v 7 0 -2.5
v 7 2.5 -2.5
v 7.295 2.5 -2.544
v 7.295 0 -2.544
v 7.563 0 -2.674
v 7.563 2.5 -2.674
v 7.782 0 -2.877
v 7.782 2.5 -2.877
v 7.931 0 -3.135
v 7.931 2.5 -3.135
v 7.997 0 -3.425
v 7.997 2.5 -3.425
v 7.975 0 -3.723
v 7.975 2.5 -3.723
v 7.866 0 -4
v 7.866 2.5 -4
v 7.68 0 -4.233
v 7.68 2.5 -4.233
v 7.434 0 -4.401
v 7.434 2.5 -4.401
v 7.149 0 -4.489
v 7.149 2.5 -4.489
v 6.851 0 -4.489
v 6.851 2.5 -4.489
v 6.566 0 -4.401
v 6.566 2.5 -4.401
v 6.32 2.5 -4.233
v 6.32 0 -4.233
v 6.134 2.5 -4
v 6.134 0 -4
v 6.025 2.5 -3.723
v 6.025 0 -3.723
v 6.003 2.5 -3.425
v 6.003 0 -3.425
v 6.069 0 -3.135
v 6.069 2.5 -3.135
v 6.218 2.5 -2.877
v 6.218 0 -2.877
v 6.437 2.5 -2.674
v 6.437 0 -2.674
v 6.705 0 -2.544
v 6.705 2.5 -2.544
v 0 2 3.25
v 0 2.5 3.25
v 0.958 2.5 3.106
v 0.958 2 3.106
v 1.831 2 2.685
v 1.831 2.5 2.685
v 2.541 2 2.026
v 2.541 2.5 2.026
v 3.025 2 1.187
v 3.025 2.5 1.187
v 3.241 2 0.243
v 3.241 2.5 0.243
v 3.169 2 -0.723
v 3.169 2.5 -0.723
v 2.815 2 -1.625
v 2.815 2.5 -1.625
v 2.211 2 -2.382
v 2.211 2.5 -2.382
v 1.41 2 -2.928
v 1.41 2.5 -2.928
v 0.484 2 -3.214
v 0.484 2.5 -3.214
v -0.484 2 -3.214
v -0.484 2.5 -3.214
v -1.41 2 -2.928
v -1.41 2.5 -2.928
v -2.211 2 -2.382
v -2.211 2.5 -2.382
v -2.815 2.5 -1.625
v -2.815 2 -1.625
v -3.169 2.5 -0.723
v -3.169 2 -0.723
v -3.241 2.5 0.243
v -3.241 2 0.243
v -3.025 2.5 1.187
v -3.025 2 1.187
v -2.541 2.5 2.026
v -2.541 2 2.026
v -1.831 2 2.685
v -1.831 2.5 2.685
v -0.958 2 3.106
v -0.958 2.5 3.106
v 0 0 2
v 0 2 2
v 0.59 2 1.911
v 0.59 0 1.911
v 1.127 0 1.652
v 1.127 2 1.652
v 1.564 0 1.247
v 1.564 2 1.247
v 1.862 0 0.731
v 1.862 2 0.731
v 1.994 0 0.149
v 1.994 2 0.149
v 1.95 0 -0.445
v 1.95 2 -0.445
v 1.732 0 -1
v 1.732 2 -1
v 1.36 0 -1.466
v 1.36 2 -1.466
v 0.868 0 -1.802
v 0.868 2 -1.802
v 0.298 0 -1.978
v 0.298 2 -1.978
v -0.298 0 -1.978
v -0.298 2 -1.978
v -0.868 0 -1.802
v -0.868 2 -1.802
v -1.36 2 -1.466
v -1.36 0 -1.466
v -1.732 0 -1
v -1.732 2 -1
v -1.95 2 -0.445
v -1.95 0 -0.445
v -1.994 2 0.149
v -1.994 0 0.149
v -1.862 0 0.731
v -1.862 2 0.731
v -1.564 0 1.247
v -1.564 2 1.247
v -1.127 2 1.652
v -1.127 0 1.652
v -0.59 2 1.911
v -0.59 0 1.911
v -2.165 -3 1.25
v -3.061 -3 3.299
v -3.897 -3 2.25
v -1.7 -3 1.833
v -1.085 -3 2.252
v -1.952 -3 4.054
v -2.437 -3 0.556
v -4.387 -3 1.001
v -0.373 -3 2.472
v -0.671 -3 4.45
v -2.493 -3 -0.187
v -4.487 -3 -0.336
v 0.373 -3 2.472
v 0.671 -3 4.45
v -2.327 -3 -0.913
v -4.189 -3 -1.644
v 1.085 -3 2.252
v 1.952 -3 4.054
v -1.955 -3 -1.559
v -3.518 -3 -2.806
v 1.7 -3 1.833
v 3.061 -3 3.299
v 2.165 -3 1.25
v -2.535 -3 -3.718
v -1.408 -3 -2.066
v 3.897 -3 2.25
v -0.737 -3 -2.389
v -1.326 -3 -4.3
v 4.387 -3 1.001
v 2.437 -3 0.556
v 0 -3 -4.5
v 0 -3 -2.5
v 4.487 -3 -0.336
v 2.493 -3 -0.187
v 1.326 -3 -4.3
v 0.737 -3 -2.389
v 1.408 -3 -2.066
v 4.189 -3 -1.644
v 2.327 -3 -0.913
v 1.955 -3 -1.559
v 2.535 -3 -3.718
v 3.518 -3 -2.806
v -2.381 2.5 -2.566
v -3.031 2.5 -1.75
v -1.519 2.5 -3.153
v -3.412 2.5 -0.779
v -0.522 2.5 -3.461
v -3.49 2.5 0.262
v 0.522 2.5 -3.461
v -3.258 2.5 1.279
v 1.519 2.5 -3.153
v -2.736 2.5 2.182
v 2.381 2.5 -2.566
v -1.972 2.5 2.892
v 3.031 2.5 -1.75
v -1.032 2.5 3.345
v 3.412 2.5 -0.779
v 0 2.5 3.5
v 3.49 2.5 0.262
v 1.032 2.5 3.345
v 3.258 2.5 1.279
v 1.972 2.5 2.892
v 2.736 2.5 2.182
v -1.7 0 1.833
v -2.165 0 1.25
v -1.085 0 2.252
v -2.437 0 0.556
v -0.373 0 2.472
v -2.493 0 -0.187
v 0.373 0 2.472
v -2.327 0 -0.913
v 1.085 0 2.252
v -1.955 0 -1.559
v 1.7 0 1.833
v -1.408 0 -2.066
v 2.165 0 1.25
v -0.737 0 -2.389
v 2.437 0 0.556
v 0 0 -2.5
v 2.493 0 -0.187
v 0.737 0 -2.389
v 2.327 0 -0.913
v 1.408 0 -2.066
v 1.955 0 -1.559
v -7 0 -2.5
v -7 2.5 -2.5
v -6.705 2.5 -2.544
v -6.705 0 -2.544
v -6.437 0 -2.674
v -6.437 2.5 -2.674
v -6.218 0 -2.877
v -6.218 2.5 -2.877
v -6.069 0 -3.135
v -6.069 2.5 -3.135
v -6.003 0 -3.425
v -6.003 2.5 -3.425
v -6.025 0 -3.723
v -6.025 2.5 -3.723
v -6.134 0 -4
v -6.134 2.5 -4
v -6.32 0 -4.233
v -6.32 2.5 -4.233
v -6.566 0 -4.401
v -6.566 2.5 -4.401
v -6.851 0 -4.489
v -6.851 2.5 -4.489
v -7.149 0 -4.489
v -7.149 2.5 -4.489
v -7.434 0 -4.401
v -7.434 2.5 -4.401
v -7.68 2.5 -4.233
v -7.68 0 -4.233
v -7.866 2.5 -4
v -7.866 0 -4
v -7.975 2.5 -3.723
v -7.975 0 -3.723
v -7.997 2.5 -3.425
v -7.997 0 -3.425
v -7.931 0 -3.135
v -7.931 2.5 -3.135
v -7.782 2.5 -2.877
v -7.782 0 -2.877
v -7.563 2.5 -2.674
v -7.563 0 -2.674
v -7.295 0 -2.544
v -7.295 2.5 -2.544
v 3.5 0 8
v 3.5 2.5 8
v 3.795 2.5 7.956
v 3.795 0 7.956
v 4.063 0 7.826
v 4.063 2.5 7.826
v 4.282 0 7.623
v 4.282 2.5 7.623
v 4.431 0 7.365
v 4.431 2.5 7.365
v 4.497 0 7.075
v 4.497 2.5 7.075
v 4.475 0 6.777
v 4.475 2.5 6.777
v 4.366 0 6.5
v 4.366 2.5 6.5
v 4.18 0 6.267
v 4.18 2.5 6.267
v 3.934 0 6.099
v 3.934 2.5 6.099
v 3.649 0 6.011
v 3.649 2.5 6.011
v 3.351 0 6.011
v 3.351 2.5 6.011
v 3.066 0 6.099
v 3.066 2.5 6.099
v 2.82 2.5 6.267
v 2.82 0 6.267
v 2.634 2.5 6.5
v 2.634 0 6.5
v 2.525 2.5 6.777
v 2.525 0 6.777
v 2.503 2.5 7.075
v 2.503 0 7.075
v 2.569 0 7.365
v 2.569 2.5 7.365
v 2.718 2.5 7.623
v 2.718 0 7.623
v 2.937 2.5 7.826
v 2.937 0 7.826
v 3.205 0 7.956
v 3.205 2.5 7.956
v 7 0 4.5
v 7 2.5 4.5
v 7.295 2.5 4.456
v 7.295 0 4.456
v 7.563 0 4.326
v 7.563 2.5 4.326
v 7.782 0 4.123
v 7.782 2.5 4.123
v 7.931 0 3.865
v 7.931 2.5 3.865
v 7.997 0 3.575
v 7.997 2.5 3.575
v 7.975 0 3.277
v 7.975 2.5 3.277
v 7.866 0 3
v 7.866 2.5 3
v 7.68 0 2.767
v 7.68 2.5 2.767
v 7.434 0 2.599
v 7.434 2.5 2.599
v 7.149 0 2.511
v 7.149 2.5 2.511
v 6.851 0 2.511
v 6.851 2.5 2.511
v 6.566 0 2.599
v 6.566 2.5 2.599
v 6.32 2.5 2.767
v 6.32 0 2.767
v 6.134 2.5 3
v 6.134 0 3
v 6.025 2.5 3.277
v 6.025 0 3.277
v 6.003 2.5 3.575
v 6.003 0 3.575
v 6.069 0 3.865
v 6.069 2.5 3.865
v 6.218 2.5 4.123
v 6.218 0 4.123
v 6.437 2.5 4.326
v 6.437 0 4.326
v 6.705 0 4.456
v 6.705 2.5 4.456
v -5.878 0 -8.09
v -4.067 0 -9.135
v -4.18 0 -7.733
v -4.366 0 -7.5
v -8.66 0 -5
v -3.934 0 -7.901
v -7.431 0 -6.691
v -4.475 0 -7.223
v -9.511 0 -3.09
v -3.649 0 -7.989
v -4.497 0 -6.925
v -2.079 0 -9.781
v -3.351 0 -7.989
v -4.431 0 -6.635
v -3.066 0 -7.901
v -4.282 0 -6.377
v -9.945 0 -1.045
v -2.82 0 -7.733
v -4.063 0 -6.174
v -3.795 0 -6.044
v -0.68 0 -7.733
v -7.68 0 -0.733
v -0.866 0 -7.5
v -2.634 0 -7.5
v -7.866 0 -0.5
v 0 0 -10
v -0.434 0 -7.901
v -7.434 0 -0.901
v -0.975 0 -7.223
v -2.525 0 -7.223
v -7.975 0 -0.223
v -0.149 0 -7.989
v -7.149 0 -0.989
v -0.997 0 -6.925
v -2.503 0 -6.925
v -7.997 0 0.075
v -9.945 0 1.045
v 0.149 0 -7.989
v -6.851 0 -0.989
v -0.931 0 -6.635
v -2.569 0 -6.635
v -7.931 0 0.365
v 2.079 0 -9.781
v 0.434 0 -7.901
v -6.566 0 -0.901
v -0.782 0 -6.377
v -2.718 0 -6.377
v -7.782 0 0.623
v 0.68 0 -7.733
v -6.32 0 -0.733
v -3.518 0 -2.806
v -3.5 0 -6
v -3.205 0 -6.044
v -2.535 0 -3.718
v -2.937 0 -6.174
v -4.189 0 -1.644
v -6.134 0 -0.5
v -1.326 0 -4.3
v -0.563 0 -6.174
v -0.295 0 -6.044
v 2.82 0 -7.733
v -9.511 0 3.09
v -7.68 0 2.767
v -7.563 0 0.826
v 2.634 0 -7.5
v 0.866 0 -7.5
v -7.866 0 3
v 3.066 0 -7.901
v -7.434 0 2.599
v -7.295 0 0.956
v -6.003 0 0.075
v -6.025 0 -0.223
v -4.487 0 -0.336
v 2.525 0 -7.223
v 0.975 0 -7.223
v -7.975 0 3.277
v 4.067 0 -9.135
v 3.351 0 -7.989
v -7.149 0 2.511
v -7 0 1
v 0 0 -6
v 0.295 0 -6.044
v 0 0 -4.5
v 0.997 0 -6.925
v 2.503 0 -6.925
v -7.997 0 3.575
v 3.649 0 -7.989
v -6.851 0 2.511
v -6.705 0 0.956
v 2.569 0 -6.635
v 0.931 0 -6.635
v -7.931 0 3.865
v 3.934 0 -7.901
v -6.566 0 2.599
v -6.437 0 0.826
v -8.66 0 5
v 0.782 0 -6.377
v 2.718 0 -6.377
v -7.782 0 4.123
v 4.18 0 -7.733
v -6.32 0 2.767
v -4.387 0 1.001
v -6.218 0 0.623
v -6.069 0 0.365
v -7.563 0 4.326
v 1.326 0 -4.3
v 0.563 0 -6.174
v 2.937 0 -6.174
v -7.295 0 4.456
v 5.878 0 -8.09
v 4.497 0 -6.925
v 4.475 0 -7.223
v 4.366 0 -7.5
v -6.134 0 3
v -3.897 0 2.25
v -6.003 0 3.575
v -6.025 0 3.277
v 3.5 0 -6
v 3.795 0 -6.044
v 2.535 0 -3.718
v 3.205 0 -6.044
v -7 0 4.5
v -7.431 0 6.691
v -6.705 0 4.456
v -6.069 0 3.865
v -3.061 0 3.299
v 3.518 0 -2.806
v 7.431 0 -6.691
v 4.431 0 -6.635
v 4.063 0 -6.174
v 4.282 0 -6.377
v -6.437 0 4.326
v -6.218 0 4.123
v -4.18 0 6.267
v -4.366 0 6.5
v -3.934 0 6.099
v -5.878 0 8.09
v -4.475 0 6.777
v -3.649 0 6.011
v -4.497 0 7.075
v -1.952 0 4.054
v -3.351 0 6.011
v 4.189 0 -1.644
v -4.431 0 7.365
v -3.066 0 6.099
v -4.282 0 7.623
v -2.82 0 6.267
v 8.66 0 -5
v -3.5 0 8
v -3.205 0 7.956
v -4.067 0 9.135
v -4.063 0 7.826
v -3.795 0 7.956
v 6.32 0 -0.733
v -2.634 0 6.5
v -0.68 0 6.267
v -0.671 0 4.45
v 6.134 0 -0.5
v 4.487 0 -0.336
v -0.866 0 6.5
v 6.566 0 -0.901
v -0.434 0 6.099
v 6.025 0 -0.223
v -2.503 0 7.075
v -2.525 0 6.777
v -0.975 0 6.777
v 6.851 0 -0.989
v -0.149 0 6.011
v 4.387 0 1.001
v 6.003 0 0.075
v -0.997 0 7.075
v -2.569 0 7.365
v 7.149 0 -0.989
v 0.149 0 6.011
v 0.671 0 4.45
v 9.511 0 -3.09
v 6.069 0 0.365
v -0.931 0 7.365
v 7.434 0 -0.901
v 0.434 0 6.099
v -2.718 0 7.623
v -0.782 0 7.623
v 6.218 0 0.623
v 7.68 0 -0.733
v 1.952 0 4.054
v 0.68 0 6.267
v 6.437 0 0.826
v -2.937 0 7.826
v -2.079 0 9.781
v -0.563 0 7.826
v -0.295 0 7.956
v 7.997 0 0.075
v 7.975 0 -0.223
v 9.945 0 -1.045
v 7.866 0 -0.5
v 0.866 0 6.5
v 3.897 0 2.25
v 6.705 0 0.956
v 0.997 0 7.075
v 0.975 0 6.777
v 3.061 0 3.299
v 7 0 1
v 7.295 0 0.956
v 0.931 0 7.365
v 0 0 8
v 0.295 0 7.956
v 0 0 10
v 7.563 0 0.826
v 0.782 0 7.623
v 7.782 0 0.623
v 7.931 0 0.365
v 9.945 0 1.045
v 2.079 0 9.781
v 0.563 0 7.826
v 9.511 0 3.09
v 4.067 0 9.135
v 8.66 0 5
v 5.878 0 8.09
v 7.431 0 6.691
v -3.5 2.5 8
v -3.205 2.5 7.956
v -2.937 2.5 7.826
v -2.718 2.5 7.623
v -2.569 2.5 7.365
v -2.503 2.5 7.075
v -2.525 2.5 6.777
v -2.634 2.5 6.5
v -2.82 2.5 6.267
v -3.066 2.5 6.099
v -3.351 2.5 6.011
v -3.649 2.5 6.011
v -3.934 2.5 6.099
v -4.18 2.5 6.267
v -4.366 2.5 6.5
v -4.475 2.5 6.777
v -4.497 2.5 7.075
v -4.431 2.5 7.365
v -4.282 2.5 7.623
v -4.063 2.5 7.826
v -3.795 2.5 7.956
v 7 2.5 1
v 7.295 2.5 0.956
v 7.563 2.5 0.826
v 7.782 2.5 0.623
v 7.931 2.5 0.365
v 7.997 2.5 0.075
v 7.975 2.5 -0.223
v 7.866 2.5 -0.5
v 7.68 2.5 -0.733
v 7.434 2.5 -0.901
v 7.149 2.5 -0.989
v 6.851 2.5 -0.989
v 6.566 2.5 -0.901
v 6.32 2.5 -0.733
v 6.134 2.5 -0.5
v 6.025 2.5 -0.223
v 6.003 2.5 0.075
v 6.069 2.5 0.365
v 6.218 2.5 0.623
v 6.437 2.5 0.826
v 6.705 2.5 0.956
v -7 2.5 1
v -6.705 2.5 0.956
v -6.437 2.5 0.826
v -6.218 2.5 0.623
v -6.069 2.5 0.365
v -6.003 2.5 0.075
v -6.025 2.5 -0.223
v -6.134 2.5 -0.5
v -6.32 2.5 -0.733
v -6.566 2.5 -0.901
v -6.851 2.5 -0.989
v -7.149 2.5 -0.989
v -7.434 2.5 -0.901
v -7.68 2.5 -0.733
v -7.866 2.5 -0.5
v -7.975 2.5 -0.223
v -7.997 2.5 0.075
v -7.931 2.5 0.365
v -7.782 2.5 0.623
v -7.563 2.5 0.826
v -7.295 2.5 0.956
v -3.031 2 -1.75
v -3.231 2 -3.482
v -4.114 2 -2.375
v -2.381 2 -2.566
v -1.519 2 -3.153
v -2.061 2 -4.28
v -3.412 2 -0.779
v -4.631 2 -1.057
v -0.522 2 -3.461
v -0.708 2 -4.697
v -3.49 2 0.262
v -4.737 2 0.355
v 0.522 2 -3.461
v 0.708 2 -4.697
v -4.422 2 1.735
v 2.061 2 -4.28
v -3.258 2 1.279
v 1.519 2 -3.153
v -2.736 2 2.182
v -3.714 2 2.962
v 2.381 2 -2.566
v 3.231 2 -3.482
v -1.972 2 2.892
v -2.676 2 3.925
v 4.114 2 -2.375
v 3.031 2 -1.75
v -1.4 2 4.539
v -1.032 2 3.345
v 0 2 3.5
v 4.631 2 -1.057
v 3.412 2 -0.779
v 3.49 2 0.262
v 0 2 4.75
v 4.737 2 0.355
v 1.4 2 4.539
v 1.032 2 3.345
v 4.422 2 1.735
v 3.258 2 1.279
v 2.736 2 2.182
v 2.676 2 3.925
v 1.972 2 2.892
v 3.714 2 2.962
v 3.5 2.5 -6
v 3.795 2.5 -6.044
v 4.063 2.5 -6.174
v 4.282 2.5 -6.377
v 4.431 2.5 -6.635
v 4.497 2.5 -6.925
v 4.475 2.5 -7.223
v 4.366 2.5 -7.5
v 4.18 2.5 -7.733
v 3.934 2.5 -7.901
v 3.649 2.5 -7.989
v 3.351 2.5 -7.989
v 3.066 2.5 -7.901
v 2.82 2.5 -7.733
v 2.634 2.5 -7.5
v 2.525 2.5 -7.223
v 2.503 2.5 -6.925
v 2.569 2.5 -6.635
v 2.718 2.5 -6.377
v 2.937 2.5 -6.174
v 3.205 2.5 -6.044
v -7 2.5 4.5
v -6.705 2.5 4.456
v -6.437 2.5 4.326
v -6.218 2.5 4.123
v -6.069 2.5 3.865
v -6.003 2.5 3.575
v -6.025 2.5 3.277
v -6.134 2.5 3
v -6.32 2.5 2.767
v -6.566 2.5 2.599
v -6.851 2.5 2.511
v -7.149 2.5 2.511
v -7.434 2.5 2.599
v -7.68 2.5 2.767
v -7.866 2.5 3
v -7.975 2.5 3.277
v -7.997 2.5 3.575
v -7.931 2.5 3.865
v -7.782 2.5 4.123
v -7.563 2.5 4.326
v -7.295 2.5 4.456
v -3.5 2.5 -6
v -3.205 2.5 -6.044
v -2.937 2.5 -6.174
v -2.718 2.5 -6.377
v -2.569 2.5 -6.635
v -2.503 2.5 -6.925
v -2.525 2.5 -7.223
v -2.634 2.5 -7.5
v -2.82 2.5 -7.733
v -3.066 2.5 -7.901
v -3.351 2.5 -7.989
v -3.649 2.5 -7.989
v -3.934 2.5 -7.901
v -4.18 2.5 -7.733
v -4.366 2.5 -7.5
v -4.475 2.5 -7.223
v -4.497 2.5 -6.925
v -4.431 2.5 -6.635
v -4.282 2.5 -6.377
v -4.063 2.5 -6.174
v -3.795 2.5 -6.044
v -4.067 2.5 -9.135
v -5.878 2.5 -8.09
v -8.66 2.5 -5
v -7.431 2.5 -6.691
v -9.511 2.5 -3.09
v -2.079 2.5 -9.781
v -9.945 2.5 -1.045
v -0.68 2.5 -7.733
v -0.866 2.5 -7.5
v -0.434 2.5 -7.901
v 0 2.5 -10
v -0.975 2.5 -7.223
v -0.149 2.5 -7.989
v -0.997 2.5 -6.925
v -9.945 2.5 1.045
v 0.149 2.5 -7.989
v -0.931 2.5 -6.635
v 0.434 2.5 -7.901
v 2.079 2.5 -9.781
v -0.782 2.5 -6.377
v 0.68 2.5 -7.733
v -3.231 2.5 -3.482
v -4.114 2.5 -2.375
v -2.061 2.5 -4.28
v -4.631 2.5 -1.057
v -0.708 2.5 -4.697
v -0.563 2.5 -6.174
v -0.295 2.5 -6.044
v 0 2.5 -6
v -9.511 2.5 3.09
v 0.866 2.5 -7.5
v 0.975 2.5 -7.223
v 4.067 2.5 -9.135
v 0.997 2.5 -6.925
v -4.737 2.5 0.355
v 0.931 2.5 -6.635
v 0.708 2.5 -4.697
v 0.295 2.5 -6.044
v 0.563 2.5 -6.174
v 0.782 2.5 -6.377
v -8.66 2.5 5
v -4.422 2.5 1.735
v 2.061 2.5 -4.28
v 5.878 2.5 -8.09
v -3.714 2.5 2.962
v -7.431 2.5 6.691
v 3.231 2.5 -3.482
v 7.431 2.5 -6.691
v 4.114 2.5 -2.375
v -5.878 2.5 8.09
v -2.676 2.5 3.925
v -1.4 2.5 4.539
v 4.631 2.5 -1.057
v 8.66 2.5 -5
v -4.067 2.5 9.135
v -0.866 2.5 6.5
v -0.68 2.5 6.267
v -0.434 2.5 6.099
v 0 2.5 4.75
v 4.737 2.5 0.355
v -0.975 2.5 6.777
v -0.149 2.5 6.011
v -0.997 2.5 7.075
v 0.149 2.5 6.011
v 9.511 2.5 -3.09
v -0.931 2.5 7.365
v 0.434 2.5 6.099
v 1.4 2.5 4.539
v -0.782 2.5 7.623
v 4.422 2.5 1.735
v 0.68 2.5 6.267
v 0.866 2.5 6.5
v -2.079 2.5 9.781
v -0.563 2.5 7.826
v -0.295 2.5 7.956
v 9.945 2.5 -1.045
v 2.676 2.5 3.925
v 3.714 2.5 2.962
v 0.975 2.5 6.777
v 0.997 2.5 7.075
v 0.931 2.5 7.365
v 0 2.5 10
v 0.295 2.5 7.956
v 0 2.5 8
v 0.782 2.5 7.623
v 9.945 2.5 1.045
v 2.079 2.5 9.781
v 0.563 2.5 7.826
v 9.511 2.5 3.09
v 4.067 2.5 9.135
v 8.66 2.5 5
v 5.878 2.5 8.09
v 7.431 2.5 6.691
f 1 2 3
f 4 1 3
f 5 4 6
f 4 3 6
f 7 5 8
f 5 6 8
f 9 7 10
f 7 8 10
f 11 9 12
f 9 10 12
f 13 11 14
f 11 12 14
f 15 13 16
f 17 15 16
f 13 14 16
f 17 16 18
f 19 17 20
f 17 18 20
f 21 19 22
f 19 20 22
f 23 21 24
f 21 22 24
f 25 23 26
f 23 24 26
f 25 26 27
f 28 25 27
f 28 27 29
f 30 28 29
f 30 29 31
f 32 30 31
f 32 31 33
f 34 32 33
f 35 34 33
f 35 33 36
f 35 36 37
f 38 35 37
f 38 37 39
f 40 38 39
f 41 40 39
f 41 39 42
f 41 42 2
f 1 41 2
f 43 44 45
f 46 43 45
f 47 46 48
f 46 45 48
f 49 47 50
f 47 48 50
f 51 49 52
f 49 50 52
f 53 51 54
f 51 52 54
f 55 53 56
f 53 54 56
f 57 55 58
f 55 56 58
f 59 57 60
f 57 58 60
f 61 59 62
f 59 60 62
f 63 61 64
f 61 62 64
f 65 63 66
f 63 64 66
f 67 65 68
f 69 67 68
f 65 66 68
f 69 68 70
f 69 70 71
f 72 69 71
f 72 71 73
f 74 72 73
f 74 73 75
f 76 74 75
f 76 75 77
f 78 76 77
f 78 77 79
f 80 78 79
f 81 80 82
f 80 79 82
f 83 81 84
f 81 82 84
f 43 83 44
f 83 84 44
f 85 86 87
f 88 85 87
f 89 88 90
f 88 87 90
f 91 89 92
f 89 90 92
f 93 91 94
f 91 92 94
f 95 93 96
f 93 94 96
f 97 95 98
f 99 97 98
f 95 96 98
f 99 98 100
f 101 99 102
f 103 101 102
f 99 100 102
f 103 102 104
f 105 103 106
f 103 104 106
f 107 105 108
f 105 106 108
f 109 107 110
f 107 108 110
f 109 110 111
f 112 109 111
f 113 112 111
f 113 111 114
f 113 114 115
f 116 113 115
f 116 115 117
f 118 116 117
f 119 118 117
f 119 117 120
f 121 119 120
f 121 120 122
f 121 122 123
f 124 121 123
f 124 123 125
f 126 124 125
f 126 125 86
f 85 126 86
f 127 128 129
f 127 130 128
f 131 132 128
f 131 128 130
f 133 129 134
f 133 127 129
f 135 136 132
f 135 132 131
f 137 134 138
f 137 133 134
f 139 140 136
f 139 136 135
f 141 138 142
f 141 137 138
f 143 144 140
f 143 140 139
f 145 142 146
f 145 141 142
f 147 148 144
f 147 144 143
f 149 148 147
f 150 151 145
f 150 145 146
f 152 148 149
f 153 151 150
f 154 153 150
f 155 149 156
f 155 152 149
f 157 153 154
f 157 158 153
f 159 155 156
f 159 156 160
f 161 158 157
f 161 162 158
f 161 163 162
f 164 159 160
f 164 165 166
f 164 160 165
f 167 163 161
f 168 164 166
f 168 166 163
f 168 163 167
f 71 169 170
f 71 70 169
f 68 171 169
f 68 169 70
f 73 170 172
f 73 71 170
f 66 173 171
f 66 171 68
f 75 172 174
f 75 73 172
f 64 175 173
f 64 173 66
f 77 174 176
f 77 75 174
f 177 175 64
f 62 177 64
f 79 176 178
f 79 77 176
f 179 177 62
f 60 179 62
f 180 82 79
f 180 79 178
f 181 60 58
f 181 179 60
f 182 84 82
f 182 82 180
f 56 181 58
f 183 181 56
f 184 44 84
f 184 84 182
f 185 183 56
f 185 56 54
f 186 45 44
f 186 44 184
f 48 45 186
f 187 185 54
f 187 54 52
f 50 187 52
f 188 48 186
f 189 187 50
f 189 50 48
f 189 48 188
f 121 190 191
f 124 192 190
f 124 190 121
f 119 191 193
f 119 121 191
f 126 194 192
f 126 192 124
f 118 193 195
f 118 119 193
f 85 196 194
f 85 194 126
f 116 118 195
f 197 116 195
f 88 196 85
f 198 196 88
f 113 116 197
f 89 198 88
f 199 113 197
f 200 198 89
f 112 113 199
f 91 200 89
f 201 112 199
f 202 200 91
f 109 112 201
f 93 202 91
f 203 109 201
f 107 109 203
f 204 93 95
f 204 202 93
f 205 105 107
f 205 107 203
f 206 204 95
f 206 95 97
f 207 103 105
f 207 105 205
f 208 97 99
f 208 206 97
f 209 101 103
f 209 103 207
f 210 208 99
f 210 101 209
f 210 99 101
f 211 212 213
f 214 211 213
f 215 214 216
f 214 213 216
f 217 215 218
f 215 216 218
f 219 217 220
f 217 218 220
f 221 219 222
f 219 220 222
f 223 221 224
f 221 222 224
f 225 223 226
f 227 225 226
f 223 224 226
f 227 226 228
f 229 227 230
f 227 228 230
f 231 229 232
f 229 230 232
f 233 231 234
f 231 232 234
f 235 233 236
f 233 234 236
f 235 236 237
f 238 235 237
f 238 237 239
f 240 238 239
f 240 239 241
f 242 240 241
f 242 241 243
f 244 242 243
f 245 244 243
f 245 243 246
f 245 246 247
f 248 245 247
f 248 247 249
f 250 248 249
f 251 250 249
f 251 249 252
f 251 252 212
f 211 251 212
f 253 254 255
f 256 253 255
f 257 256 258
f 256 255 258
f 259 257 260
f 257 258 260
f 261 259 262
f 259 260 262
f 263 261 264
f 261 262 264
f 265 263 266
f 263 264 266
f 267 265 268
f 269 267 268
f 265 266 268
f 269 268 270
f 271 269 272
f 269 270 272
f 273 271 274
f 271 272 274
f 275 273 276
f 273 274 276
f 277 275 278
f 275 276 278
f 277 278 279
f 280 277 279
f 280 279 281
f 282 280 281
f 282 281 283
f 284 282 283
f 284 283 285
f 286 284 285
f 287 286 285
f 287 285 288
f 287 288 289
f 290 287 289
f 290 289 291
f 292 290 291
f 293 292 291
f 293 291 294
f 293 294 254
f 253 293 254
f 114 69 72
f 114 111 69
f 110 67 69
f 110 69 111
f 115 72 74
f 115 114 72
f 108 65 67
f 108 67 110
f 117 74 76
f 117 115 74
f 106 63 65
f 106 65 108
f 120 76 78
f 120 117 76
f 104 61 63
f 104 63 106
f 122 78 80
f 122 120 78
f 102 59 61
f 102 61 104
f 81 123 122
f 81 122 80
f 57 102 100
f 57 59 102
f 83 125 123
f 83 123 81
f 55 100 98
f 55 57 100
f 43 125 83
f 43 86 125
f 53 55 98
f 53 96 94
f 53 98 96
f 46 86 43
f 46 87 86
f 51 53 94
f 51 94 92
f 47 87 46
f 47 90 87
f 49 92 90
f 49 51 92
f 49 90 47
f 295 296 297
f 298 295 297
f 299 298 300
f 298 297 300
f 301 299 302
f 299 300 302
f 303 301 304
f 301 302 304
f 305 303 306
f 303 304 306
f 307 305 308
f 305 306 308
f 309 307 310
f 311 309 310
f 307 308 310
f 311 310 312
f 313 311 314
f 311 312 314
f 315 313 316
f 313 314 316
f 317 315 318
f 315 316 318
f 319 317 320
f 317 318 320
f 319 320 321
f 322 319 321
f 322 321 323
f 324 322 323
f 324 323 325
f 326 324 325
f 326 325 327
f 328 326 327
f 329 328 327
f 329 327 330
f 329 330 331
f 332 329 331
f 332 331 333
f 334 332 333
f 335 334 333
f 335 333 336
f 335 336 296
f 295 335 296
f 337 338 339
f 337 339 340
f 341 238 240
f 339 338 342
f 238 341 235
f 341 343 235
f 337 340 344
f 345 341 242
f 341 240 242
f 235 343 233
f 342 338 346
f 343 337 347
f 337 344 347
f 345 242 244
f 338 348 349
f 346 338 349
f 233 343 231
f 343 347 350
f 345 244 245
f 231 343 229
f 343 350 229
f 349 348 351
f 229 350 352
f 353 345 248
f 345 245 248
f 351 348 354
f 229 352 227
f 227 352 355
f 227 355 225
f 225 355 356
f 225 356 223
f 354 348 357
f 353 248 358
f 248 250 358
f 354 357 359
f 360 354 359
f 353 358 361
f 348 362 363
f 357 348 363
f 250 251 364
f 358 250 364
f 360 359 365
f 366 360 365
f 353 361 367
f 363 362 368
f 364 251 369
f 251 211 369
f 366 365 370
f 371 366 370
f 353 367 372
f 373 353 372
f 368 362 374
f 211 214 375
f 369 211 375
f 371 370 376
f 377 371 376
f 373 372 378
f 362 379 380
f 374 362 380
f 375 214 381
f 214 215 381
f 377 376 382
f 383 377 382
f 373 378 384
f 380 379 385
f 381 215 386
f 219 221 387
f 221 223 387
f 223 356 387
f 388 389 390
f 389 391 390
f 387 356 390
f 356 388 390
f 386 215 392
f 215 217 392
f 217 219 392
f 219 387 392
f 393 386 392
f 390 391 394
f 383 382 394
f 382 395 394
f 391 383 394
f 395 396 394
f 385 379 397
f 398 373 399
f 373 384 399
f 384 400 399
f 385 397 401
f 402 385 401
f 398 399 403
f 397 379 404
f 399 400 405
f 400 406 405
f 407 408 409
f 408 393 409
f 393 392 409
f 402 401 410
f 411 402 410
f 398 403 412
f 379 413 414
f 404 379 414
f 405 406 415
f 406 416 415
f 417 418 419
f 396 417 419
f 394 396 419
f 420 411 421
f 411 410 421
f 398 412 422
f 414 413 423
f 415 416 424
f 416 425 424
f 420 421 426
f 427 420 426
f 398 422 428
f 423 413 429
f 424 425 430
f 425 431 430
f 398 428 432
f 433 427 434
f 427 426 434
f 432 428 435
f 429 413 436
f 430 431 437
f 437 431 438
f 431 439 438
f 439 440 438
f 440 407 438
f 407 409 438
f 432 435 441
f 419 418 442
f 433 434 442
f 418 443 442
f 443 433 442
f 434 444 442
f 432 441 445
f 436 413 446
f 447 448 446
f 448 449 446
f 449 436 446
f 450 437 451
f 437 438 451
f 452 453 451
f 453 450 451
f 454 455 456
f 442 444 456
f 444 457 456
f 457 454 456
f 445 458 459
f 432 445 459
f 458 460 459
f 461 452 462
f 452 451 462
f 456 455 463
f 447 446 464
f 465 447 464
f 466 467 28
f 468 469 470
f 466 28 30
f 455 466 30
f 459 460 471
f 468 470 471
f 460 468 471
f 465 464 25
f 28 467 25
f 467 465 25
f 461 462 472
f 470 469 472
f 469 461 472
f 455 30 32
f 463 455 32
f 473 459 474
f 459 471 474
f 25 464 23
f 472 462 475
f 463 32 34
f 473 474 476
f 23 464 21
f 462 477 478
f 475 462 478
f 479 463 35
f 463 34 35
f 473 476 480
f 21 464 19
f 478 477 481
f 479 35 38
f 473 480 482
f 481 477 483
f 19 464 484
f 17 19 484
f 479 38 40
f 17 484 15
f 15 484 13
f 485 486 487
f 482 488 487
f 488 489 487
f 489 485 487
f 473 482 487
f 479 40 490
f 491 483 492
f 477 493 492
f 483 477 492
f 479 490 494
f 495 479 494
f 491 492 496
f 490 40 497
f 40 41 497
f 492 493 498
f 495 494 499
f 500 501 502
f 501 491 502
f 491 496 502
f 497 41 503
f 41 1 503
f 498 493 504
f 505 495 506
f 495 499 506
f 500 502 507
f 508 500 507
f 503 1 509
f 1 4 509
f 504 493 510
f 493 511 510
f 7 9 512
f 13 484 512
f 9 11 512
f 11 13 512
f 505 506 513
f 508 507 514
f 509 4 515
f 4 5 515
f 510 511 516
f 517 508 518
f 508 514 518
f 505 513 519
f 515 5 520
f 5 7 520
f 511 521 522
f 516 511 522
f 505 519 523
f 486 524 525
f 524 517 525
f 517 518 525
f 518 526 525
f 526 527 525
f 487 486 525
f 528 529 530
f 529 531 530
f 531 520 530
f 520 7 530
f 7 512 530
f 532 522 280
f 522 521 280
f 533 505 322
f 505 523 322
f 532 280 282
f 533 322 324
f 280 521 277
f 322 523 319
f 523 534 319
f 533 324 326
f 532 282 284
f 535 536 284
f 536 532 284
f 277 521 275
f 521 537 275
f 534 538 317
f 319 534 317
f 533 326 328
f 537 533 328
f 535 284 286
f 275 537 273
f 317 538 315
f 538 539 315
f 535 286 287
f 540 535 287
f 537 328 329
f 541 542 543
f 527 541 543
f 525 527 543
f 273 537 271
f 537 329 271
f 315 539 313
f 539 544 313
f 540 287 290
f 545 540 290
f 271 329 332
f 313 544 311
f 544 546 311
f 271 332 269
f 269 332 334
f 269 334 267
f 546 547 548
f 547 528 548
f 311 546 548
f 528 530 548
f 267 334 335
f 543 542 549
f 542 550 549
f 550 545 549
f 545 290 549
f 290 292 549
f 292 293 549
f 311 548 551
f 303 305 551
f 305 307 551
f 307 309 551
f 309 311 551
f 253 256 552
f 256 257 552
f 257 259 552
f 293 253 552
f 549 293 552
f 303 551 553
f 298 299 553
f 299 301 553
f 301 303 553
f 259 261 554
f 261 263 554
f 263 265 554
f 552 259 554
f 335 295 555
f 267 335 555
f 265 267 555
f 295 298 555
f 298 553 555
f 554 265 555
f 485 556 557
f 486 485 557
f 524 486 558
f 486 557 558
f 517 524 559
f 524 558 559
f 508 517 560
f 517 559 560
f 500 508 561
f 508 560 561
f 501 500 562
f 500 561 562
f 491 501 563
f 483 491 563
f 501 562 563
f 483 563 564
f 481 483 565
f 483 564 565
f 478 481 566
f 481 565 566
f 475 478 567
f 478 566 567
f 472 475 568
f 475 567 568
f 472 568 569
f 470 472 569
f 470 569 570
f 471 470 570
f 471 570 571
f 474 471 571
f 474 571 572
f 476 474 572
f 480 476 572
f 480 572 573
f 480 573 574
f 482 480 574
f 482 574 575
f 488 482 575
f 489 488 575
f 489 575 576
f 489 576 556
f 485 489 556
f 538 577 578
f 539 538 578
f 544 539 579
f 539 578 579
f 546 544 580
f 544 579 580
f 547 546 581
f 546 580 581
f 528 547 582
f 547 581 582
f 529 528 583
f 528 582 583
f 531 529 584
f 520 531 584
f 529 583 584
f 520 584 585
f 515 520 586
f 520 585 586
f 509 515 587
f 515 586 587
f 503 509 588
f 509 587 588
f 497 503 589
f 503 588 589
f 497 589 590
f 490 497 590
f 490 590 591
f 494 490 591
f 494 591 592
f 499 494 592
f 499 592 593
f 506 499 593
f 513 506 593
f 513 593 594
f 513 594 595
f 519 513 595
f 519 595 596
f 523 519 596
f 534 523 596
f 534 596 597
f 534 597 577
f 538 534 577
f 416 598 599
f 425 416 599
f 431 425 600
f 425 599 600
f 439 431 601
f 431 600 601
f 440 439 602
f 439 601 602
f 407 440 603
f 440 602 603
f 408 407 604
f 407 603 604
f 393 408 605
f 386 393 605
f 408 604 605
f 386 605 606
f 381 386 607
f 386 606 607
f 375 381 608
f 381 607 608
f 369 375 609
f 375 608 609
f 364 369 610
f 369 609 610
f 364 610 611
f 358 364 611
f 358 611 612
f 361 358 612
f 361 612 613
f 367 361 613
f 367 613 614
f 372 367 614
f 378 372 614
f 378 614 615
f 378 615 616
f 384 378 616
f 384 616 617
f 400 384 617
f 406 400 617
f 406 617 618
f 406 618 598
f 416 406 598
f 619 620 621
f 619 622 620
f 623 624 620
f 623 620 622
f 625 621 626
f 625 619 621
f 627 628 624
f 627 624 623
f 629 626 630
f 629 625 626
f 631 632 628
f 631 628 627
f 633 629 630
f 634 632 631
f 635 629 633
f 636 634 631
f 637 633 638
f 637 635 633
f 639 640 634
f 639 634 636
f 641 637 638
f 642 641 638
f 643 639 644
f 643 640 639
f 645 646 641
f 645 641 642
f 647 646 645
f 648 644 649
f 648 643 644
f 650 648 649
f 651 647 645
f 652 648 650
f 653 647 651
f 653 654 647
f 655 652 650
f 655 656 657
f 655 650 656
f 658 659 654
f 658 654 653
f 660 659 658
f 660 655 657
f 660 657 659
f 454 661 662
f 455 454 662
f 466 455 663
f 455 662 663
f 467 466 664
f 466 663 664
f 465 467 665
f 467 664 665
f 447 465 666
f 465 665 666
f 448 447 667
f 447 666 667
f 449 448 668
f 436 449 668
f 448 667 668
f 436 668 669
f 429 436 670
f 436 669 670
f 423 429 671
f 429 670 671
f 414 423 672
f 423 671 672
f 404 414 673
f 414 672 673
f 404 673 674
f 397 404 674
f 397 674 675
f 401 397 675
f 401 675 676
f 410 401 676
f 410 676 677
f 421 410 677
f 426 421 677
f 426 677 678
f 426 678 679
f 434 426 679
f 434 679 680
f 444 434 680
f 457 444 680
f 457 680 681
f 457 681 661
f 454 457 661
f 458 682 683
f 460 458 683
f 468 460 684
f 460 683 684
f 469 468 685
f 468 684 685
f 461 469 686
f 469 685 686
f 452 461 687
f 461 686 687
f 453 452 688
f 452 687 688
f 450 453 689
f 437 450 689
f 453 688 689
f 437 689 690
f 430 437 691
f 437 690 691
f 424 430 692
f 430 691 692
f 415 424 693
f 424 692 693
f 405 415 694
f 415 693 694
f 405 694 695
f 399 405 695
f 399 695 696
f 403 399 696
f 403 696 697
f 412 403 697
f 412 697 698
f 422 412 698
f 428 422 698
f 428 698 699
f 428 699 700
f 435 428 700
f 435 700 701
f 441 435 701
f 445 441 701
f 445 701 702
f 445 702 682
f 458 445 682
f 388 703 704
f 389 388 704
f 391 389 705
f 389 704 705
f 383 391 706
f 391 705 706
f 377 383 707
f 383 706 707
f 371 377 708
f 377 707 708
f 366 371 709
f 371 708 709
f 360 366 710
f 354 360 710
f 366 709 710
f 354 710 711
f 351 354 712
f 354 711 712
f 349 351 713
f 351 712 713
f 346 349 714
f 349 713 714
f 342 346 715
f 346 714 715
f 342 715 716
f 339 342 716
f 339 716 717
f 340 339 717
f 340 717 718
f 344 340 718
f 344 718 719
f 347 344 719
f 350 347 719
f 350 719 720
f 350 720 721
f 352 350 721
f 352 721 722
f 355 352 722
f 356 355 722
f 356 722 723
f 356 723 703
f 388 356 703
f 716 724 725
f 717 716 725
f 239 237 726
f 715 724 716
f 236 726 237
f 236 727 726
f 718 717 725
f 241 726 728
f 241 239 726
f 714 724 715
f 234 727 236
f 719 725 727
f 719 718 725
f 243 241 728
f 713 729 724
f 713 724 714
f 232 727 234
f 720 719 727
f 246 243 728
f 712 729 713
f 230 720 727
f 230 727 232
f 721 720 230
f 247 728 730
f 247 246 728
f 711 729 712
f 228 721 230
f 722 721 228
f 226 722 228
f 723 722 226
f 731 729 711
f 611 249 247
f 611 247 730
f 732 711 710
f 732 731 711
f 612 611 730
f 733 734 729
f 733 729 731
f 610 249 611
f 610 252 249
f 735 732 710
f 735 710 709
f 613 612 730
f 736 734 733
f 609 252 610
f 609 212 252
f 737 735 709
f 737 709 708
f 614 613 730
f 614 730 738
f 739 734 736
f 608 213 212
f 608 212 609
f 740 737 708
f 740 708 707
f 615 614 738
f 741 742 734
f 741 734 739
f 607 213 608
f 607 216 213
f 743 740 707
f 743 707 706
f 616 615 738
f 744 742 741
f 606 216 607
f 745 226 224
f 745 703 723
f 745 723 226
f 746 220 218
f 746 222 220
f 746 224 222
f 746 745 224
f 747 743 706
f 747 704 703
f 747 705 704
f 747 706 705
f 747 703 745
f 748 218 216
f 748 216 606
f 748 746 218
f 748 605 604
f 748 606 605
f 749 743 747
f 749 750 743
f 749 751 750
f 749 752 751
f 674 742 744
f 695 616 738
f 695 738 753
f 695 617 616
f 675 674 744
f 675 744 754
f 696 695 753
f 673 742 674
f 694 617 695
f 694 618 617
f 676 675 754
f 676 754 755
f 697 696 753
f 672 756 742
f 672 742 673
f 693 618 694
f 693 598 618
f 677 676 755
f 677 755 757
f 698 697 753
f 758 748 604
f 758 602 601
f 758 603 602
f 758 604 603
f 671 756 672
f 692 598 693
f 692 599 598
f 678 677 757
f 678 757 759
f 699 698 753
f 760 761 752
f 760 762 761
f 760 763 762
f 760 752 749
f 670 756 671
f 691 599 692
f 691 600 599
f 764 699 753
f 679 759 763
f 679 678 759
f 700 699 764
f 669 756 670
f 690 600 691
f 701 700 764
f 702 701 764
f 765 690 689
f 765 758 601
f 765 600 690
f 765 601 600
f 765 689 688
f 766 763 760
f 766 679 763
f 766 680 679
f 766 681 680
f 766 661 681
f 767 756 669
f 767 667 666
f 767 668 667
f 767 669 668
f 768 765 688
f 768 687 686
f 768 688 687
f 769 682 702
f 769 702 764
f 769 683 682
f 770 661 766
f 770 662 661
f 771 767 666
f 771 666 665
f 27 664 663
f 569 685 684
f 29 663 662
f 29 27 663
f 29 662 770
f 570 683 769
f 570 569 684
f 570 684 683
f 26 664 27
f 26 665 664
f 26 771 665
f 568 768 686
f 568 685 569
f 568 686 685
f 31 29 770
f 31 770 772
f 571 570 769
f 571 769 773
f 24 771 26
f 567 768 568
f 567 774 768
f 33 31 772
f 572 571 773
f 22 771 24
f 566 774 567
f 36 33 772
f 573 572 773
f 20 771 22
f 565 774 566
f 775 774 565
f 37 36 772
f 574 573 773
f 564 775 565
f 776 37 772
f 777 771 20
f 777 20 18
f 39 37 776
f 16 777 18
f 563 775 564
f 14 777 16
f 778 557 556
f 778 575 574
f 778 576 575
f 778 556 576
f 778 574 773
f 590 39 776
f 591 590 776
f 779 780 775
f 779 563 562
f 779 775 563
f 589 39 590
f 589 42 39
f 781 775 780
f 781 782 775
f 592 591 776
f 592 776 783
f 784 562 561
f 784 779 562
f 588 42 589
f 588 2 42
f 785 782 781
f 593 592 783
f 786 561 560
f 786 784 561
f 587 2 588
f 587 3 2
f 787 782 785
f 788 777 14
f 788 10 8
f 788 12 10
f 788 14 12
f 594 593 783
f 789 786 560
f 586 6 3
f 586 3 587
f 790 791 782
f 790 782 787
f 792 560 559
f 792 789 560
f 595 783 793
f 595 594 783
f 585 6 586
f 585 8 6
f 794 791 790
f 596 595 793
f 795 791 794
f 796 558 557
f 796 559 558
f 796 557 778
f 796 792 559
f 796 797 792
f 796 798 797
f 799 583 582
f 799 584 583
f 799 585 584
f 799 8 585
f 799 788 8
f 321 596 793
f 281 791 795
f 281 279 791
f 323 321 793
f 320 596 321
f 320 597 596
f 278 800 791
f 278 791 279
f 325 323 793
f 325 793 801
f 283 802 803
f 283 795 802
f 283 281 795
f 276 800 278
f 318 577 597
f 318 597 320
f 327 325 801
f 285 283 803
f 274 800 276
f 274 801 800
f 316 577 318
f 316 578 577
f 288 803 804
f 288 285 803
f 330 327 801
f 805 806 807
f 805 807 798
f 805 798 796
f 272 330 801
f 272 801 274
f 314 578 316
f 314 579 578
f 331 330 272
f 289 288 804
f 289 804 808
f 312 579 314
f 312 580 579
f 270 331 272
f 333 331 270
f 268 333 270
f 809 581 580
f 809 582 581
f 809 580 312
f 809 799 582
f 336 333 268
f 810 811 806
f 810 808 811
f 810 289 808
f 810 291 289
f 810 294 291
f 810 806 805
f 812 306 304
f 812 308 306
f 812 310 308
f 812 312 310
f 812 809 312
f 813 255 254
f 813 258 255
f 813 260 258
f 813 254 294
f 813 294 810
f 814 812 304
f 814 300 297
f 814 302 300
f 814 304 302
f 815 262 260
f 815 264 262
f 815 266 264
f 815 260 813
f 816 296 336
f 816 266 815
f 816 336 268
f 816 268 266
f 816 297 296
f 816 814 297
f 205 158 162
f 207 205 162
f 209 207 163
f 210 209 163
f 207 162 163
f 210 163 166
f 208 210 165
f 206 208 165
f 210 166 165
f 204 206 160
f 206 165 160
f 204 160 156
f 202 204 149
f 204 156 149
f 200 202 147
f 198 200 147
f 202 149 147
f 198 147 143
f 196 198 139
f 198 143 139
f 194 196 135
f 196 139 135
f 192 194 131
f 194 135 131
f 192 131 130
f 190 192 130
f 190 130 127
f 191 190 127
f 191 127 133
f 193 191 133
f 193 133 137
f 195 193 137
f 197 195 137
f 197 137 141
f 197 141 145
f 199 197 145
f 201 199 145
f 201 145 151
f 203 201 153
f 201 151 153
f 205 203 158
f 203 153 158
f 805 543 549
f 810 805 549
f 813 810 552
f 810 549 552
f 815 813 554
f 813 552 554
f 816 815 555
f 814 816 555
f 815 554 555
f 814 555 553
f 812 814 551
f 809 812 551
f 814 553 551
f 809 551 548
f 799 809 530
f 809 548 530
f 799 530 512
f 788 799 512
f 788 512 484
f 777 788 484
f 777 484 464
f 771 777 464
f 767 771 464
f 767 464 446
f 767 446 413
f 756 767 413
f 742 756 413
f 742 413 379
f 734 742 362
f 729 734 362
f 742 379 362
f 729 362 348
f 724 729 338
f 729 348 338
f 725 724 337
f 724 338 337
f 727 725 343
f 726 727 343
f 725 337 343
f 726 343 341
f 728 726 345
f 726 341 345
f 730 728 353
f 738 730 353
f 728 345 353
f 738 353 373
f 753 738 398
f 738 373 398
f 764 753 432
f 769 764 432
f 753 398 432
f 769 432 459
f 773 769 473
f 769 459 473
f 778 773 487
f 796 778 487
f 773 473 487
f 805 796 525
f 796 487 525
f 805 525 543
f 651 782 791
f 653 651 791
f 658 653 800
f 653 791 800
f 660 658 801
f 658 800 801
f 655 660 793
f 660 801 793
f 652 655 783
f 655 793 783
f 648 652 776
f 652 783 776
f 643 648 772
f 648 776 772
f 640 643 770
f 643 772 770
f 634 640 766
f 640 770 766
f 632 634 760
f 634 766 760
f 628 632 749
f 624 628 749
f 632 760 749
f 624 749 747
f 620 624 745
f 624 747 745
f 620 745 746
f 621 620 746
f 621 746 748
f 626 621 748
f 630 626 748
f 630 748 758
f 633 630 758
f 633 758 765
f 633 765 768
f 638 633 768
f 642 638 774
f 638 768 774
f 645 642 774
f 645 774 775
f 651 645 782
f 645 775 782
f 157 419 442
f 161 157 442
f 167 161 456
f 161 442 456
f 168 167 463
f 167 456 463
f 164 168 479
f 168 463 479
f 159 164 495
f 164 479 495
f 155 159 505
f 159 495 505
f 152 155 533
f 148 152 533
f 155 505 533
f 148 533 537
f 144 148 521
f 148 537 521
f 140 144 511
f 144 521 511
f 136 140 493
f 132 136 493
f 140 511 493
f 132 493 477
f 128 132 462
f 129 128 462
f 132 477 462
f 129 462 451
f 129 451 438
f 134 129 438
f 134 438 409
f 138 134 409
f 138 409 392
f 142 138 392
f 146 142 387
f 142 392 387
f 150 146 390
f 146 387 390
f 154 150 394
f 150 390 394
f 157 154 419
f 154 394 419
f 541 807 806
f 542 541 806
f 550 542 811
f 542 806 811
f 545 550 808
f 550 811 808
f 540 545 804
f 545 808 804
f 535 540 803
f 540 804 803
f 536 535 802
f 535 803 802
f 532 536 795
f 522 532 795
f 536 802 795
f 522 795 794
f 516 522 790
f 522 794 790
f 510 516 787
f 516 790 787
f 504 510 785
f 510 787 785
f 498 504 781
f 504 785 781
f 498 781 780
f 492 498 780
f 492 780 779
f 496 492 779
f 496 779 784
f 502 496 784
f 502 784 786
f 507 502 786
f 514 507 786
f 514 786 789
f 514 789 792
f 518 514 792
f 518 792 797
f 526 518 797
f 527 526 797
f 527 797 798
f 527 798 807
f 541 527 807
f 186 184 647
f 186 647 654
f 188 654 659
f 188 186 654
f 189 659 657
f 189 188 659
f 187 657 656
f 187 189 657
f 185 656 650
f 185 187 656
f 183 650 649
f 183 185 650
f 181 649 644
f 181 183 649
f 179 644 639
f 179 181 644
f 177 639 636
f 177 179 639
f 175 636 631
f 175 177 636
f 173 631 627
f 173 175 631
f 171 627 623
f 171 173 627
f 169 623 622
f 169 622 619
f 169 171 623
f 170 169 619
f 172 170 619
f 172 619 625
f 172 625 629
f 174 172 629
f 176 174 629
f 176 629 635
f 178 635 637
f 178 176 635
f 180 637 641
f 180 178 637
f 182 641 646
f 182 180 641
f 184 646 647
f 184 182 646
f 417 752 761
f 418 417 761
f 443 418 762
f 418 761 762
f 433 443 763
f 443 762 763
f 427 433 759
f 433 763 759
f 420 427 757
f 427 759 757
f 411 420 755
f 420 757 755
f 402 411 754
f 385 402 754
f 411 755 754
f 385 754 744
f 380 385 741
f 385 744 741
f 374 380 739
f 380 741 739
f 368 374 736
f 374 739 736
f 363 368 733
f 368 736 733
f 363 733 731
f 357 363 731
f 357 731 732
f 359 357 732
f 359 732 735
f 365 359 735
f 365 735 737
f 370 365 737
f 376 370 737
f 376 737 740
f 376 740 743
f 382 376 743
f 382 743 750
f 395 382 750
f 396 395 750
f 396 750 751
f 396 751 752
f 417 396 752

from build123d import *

# Parameters (mm, degrees)
CROQUIS1_R              = 10
SALIENTE_EXTRUIR1_DEPTH = 2.5
CROQUIS3_R              = 4.5
SALIENTE_EXTRUIR2_DEPTH = 3
CROQUIS4_R              = 2
CORTAR_EXTRUIR1_DEPTH   = 16.173990905
CROQUIS5_R              = 2.5
CORTAR_EXTRUIR2_DEPTH   = 3
CROQUIS6_R              = 4.75
CROQUIS6_R_2            = 3.5
CROQUIS6_R_3            = 3.25
CROQUIS6_R_4            = 2
CORTAR_EXTRUIR3_DEPTH   = 0.5
CROQUIS7_R              = 1
CORTAR_EXTRUIR4_DEPTH   = 16.173990905


with BuildPart() as part:
    # Croquis1 → Saliente-Extruir1 (new body)
    with BuildSketch(Plane(origin=(0, 0, 0), x_dir=(1, 0, 0), z_dir=(0, 1, 0))):
        with Locations(Location((0, 0, 0), (0, 0, 270))):
            Circle(CROQUIS1_R)
    extrude(amount=SALIENTE_EXTRUIR1_DEPTH)

    # Croquis3 → Saliente-Extruir2 (add)
    with BuildSketch(Plane.XZ):
        with Locations(Location((0, 0, 0), (0, 0, 270))):
            Circle(CROQUIS3_R)
    extrude(amount=SALIENTE_EXTRUIR2_DEPTH)

    # Croquis4 → Cortar-Extruir1 (cut, through all)
    with BuildSketch(Plane(origin=(0, 2.5, 0), x_dir=(1, 0, 0), z_dir=(0, 1, 0))):
        with Locations(Location((0, 0, 0), (0, 0, 270))):
            Circle(CROQUIS4_R)
    extrude(amount=-CORTAR_EXTRUIR1_DEPTH, mode=Mode.SUBTRACT)

    # Croquis5 → Cortar-Extruir2 (cut)
    with BuildSketch(Plane.XZ.offset(3)):
        with Locations(Location((0, 0, 0), (0, 0, 270))):
            Circle(CROQUIS5_R)
    extrude(amount=-CORTAR_EXTRUIR2_DEPTH, mode=Mode.SUBTRACT)

    # Croquis6 → Cortar-Extruir3 (cut)
    # profile 1 of 2: a face of its own
    with BuildSketch(Plane(origin=(0, 2.5, 0), x_dir=(1, 0, 0), z_dir=(0, 1, 0))):
        with Locations(Location((0, 0, 0), (0, 0, 270))):
            Circle(CROQUIS6_R)
        with Locations(Location((0, 0, 0), (0, 0, 270))):
            Circle(CROQUIS6_R_2, mode=Mode.SUBTRACT)
    # profile 2 of 2: a face of its own
    with BuildSketch(Plane(origin=(0, 2.5, 0), x_dir=(1, 0, 0), z_dir=(0, 1, 0))):
        with Locations(Location((0, 0, 0), (0, 0, 270))):
            Circle(CROQUIS6_R_3)
        with Locations(Location((0, 0, 0), (0, 0, 270))):
            Circle(CROQUIS6_R_4, mode=Mode.SUBTRACT)
    extrude(amount=-CORTAR_EXTRUIR3_DEPTH, mode=Mode.SUBTRACT)

    # Croquis7 → Cortar-Extruir4 (cut, through all)
    with BuildSketch(Plane(origin=(0, 2.5, 0), x_dir=(1, 0, 0), z_dir=(0, 1, 0))):
        with Locations(Location((0, -7, 0), (0, 0, 270))):
            Circle(CROQUIS7_R)
        with Locations(Location((3.5, -7, 0), (0, 0, 270))):
            Circle(CROQUIS7_R)
        with Locations(Location((-3.5, -7, 0), (0, 0, 270))):
            Circle(CROQUIS7_R)
        with Locations(Location((7, 3.5, 0), (0, 0, 270))):
            Circle(CROQUIS7_R)
        with Locations(Location((7, 0, 0), (0, 0, 270))):
            Circle(CROQUIS7_R)
        with Locations(Location((7, -3.5, 0), (0, 0, 270))):
            Circle(CROQUIS7_R)
        with Locations(Location((-3.5, 7, 0), (0, 0, 270))):
            Circle(CROQUIS7_R)
        with Locations(Location((0, 7, 0), (0, 0, 270))):
            Circle(CROQUIS7_R)
        with Locations(Location((3.5, 7, 0), (0, 0, 270))):
            Circle(CROQUIS7_R)
        with Locations(Location((-7, 3.5, 0), (0, 0, 270))):
            Circle(CROQUIS7_R)
        with Locations(Location((-7, 0, 0), (0, 0, 270))):
            Circle(CROQUIS7_R)
        with Locations(Location((-7, -3.5, 0), (0, 0, 270))):
            Circle(CROQUIS7_R)
    extrude(amount=-CORTAR_EXTRUIR4_DEPTH, mode=Mode.SUBTRACT)


solid = part.part
